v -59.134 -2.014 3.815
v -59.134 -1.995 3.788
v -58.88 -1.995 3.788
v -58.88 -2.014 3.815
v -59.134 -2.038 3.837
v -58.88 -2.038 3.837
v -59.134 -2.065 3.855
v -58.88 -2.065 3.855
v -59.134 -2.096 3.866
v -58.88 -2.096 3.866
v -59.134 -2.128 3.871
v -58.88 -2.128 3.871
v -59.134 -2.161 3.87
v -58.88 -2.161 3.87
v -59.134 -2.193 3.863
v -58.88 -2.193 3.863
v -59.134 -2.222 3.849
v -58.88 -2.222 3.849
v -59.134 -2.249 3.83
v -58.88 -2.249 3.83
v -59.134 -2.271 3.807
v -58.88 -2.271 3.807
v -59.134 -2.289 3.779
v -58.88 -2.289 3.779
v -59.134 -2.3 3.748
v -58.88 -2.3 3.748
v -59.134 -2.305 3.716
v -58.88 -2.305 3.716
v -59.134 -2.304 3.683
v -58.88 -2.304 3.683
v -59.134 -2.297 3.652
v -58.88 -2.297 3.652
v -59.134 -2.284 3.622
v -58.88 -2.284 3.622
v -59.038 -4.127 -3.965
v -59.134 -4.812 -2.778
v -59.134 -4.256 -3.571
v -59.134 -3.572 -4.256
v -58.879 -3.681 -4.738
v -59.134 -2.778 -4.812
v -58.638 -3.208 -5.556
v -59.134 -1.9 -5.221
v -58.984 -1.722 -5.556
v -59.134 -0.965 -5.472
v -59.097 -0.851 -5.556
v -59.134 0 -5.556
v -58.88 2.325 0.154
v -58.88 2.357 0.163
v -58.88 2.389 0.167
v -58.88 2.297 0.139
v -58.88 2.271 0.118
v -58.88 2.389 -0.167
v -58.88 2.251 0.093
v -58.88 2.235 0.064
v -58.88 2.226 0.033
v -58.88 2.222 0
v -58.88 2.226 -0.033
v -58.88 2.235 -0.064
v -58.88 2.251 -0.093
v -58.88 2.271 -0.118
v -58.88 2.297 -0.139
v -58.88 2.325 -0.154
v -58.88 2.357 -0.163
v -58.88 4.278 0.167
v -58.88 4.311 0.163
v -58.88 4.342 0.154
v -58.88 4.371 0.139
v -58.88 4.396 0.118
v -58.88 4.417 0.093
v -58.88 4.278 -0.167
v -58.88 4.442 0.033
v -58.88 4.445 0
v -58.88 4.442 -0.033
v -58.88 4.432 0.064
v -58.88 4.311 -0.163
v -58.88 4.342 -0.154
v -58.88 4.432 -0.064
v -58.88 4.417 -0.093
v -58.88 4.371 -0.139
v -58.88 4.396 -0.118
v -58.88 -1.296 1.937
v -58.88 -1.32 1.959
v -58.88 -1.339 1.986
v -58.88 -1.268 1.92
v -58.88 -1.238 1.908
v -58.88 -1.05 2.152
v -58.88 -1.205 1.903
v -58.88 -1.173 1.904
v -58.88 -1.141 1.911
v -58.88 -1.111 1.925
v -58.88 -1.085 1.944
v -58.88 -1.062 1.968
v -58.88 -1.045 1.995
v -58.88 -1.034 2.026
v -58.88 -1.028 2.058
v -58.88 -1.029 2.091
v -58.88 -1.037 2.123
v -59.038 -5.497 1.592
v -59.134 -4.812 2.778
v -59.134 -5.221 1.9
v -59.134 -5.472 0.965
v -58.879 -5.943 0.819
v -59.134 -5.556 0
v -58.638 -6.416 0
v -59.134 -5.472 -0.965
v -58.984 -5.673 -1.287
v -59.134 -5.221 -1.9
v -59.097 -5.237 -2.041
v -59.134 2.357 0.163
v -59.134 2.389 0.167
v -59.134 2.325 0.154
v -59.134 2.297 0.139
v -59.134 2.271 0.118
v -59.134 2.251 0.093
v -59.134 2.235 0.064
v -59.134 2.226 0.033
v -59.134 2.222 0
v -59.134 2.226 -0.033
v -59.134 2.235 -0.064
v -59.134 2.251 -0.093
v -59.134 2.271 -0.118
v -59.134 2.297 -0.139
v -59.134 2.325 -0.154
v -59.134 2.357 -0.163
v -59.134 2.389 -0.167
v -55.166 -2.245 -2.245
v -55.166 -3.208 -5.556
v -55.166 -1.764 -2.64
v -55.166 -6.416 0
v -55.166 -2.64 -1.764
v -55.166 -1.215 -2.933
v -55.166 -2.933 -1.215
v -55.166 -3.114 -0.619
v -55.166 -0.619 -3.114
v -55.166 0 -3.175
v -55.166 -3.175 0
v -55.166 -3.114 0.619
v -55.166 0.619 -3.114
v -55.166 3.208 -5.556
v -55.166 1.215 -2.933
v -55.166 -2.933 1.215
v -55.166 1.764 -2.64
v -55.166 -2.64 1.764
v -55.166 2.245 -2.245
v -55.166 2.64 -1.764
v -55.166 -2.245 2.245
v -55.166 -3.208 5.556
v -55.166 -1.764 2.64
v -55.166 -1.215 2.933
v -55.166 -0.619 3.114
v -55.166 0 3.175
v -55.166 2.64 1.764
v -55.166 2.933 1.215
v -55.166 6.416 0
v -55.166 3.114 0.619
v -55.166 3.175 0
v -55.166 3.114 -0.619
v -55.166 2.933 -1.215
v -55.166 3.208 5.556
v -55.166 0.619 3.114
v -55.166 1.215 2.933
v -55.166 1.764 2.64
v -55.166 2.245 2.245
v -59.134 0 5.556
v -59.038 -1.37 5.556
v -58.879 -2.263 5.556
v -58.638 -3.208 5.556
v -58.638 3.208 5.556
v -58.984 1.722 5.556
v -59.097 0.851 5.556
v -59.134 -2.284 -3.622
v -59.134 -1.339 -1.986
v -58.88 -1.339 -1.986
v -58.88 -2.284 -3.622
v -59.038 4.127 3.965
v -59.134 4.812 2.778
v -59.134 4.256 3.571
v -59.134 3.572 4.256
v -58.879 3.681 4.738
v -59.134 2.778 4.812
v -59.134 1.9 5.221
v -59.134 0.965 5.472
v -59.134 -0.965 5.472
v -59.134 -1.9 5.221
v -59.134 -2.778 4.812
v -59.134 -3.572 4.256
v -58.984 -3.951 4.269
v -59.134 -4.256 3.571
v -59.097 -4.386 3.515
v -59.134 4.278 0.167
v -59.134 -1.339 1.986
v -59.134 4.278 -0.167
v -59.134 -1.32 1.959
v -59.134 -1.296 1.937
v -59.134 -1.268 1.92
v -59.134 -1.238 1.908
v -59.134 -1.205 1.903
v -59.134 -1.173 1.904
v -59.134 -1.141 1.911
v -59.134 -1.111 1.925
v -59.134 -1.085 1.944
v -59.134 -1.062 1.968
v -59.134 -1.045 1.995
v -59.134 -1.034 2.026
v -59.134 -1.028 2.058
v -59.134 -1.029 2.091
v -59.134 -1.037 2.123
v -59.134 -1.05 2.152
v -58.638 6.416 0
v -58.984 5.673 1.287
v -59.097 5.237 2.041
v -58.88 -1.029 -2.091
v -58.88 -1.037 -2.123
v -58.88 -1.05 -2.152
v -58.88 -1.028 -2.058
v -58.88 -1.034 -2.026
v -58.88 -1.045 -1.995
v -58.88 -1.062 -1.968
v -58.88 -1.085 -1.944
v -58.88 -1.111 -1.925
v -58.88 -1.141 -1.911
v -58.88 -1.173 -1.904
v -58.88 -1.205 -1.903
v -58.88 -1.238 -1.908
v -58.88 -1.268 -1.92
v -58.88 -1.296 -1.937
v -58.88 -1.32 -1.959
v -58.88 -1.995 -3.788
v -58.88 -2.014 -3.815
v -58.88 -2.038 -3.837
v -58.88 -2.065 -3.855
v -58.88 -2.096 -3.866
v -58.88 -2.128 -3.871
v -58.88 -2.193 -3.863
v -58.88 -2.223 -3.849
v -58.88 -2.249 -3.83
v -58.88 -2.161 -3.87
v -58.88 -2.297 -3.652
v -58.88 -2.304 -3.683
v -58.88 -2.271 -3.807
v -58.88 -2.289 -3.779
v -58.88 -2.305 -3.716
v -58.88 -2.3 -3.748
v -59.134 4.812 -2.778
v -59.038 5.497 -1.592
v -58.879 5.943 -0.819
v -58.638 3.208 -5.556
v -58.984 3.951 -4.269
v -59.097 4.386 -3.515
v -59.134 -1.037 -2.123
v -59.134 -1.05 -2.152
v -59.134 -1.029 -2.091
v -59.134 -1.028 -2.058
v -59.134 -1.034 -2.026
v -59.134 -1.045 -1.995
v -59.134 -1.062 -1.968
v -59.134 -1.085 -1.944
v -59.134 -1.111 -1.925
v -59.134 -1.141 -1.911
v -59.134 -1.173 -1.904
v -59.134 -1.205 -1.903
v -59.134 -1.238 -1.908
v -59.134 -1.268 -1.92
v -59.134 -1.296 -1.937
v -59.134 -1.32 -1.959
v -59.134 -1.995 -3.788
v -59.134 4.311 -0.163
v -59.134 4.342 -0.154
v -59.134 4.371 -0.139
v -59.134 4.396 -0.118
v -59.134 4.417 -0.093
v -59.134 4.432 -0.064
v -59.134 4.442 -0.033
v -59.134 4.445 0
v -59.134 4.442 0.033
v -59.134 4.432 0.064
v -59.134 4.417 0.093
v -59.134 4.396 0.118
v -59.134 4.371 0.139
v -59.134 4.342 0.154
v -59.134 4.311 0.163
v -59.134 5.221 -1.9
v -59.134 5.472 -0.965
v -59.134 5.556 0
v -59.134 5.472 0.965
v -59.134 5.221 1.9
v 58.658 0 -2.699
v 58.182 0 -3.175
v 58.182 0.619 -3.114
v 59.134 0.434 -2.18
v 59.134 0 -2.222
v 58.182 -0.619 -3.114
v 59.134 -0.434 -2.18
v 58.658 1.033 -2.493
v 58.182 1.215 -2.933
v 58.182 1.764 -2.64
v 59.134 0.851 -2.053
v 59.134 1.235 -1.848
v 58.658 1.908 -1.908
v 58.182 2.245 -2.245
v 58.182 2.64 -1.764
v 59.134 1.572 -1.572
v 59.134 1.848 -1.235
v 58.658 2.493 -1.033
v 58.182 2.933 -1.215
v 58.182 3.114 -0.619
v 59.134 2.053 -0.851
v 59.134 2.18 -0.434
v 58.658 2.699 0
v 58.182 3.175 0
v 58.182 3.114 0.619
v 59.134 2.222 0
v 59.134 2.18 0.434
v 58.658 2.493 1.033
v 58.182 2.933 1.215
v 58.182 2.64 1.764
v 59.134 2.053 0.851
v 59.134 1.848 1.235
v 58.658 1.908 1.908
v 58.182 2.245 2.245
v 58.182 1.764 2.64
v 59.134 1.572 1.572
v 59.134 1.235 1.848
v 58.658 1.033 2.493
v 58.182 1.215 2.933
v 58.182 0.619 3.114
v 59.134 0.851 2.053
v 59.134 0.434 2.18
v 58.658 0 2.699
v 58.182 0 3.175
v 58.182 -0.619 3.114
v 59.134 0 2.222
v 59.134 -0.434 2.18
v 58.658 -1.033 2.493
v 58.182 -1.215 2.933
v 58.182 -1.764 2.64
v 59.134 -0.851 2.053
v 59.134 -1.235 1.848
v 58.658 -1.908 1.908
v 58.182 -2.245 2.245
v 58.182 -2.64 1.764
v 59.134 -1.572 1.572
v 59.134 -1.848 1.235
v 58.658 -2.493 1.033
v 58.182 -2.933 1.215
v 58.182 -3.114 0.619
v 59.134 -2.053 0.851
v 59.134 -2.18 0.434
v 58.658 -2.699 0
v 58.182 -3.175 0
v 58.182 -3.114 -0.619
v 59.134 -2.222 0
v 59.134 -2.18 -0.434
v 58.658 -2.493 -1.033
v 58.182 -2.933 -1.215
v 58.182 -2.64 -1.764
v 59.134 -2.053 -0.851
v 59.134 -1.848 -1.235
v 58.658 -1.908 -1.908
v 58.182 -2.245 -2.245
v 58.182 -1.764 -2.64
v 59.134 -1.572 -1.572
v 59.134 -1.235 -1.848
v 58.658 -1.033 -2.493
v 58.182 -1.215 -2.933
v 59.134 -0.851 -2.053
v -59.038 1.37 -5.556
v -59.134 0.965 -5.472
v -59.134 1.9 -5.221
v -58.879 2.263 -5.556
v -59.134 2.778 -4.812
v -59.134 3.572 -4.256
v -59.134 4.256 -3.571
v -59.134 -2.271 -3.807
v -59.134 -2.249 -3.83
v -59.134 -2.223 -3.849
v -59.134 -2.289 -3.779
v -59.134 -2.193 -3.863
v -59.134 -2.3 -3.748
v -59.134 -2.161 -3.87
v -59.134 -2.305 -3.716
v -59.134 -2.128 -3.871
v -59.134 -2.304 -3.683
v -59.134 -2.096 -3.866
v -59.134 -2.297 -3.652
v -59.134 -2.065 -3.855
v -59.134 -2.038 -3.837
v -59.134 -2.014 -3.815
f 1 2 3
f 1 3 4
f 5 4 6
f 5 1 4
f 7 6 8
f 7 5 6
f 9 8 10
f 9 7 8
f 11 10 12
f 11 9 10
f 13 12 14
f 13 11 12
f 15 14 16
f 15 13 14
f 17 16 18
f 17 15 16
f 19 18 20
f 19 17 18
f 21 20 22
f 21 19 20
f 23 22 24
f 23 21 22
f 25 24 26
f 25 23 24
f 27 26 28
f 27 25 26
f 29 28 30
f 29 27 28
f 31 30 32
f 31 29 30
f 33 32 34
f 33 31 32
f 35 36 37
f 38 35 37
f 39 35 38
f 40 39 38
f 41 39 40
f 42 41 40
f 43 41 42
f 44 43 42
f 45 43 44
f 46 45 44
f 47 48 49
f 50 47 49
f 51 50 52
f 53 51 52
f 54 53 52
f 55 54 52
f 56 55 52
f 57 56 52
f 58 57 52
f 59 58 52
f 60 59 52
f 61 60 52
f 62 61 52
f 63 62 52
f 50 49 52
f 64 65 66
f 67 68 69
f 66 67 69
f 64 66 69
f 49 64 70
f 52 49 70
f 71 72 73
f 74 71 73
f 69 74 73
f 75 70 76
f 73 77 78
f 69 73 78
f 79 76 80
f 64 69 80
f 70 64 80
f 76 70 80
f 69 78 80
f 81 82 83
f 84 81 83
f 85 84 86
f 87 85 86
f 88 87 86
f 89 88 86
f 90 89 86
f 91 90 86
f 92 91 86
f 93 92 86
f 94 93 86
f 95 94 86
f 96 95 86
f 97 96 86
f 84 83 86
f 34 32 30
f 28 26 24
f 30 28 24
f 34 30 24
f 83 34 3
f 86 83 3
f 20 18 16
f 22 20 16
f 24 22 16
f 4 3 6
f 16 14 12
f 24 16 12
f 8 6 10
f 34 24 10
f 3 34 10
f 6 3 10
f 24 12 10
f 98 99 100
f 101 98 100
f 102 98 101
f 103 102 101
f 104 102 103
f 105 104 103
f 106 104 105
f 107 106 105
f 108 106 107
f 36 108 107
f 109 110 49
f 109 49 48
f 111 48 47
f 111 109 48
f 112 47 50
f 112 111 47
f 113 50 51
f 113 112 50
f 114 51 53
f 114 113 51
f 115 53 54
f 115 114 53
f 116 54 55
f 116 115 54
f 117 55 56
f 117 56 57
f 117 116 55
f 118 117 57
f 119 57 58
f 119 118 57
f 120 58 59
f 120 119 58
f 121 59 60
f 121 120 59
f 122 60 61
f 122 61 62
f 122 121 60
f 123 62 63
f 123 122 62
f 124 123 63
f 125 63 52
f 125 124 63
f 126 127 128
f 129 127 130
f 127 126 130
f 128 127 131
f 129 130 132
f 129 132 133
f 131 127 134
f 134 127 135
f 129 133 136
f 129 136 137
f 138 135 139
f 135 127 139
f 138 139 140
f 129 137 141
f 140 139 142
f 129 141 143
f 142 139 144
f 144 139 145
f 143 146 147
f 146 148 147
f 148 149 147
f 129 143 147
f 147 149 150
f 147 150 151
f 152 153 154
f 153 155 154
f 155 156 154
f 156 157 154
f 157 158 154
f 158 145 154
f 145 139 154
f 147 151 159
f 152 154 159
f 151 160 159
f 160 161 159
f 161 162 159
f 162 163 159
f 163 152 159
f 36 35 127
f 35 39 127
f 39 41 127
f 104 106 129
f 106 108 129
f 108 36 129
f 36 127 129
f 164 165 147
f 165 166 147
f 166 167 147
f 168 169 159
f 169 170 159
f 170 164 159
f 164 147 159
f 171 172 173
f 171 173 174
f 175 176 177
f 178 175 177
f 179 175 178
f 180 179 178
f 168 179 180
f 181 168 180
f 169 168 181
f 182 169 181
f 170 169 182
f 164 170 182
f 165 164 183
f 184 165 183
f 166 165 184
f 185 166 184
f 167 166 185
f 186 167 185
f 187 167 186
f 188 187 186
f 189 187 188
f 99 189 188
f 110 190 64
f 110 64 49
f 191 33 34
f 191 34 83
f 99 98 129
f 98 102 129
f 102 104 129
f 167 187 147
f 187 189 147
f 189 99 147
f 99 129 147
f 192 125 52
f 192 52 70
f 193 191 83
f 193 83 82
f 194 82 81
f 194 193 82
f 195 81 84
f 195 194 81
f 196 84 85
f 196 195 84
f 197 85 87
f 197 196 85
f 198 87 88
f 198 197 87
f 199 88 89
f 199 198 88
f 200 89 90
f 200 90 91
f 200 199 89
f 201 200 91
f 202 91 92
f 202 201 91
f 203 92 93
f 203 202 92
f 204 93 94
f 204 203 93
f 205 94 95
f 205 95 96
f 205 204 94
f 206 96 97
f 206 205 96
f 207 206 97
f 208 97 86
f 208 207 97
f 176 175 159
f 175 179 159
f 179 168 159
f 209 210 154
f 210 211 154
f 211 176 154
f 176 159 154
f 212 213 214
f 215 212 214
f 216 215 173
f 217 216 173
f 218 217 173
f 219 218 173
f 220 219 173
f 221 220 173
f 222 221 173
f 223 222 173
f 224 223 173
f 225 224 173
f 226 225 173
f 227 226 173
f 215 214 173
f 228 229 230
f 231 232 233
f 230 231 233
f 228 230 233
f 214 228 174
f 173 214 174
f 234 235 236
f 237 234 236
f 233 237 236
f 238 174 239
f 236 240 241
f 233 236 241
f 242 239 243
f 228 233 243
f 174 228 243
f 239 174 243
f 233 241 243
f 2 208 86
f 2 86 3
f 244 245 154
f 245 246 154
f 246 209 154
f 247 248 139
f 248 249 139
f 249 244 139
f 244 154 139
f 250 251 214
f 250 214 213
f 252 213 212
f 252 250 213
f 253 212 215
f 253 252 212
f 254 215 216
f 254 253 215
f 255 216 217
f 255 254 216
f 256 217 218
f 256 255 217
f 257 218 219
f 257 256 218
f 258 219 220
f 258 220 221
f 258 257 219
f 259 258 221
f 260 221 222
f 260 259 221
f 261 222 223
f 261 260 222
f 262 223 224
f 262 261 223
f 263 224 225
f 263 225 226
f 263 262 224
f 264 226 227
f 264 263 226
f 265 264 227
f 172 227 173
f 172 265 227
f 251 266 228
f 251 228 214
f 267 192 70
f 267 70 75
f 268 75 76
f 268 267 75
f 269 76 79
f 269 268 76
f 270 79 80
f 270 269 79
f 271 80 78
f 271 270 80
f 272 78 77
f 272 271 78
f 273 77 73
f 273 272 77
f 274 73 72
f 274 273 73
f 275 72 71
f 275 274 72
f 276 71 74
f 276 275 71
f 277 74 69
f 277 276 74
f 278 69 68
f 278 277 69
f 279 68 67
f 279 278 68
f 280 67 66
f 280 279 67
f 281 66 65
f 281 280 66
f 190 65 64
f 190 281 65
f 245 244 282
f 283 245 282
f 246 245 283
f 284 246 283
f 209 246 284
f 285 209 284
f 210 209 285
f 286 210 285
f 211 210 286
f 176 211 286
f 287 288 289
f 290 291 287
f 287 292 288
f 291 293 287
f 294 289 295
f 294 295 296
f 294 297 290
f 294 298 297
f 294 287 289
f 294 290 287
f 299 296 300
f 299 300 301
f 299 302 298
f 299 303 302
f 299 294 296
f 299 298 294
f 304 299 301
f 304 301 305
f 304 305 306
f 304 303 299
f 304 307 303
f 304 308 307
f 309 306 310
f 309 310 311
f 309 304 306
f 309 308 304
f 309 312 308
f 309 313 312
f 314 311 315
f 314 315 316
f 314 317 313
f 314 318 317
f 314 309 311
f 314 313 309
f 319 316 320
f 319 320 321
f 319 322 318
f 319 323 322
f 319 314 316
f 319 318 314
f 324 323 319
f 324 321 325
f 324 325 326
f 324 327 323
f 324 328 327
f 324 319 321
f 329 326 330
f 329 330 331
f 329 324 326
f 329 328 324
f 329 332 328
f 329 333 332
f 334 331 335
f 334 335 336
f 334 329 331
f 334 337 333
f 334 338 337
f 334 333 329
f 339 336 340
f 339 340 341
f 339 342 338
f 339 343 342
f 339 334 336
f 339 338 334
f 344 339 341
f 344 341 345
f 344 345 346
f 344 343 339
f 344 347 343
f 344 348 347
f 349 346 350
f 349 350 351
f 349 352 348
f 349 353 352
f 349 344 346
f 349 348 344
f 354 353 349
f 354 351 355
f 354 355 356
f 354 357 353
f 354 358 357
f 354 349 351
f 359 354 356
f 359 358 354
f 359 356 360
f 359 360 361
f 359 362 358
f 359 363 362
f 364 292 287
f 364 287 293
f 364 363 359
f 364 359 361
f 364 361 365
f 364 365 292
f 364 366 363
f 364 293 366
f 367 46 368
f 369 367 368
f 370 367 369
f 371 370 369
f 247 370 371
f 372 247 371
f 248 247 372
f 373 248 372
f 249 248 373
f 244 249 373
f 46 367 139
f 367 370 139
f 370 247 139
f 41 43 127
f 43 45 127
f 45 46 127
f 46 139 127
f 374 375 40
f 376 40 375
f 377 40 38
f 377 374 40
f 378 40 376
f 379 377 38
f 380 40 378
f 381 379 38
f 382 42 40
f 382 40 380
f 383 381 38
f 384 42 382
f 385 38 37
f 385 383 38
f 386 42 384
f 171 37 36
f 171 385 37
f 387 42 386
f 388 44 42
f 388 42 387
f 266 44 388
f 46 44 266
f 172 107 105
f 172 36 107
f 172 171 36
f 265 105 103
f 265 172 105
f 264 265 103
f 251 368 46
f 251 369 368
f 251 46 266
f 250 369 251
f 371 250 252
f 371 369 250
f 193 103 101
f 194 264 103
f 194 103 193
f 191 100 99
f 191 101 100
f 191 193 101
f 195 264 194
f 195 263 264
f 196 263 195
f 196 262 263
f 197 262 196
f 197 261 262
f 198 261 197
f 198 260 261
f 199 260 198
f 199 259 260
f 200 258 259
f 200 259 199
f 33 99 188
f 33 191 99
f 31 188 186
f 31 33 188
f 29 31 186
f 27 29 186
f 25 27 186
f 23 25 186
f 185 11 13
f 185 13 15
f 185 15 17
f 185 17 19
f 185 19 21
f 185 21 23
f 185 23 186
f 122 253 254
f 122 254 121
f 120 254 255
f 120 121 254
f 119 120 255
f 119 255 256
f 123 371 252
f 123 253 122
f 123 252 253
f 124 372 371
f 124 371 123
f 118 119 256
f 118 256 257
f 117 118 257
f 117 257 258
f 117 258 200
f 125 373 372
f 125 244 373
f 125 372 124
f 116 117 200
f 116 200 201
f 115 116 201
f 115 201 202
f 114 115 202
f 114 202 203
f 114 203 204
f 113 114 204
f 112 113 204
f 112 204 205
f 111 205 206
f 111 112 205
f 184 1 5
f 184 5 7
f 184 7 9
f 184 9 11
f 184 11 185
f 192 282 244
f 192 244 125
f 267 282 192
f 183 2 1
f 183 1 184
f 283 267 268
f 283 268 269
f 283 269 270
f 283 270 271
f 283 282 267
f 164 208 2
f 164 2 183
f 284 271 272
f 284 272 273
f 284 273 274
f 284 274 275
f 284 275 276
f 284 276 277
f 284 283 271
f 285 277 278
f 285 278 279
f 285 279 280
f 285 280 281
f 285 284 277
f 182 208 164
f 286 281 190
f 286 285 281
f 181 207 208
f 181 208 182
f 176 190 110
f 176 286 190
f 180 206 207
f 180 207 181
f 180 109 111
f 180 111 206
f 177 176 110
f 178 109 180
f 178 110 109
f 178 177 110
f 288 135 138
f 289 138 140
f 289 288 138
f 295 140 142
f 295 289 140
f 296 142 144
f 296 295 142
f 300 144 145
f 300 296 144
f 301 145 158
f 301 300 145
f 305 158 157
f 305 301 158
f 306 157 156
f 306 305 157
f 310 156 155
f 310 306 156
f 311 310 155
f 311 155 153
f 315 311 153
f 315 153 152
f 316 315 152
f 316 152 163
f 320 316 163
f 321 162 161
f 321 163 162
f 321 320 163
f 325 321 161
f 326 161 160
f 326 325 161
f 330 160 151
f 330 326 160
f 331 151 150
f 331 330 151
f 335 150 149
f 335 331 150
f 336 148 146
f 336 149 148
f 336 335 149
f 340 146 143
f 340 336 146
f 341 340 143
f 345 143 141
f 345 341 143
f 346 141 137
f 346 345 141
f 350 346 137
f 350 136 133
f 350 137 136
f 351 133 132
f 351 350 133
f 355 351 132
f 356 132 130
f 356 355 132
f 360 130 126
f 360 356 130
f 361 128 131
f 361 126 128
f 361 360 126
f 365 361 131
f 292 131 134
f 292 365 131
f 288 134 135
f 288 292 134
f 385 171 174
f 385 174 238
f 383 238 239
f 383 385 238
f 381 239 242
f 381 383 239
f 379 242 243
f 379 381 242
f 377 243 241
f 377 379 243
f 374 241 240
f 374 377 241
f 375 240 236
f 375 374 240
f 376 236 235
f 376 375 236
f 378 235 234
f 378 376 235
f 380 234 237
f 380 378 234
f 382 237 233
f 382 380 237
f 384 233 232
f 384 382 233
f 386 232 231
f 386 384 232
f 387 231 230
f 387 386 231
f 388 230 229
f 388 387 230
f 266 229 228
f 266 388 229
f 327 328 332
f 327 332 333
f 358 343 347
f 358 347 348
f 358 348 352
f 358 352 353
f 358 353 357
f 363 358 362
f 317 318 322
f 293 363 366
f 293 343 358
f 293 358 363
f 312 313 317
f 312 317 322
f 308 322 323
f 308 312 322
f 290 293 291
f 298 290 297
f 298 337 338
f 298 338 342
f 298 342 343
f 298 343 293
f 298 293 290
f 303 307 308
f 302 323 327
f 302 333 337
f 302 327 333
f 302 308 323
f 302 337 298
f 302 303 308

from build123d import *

# Parameters (mm, degrees)
SKETCH5_R           = 3.175
BOSS_EXTRUDE3_DEPTH = 114.3
CHAMFER1_SIZE       = 0.9525
BOSS_EXTRUDE4_DEPTH = 3.96875
SKETCH8_OUTSIDE_W   = 450.168
SKETCH8_OUTSIDE_H   = 451.888
SKETCH8_OUTSIDE_R   = 5.55625
CUT_EXTRUDE3_DEPTH  = 119.26875
CUT_EXTRUDE3_TAPER  = 60
CUT_EXTRUDE4_DEPTH  = 0.254
CIRPATTERN1_COUNT   = 3


with BuildPart() as part:
    # Sketch5 → Boss-Extrude3 (new body)
    with BuildSketch(Plane(origin=(59.134375, 0, 0), x_dir=(0, 0, -1), z_dir=(1, 0, 0))):
        Circle(SKETCH5_R)
    extrude(amount=-BOSS_EXTRUDE3_DEPTH)

    # Chamfer1
    chamfer1_edges = [part.edges().sort_by_distance(p)[0] for p in [
        (59.134375, 0, 3.175),
    ]]
    chamfer(chamfer1_edges, length=CHAMFER1_SIZE)

    # Sketch11 → Revolve1 (revolve)
    with BuildSketch(Plane.XY):
        Polygon((-55.165625, 3.175), (-55.165625, 0), (43.259375, 0), (40.084375, 3.175), align=None)
    revolve(axis=Axis((-55.165625, 0, 0), (1, 0, 0)))

    # Sketch6 → Boss-Extrude4 (add)
    with BuildSketch(Plane.ZY.offset(55.165625)):
        Polygon((5.55625, 3.207902433), (0, 6.415804866), (-5.55625, 3.207902433), (-5.55625, -3.207902433), (0, -6.415804866), (5.55625, -3.207902433), align=None)
    extrude(amount=BOSS_EXTRUDE4_DEPTH)

    # Sketch8 outside → Cut-Extrude3 (cut, through all)
    with BuildSketch(Plane.ZY.offset(59.134375)):
        Rectangle(SKETCH8_OUTSIDE_W, SKETCH8_OUTSIDE_H)
        Circle(SKETCH8_OUTSIDE_R, mode=Mode.SUBTRACT)
    extrude(amount=-CUT_EXTRUDE3_DEPTH, taper=CUT_EXTRUDE3_TAPER, mode=Mode.SUBTRACT)

    # Sketch12 → Cut-Extrude4 (cut)
    with BuildSketch(Plane.ZY.offset(59.134375)):
        with BuildLine():
            Line((0.1666875, 4.2783125), (0.1666875, 2.3891875))
            ThreePointArc((0.1666875, 2.3891875), (0, 2.2225), (-0.1666875, 2.3891875))
            Line((-0.1666875, 2.3891875), (-0.1666875, 4.2783125))
            ThreePointArc((-0.1666875, 4.2783125), (0, 4.445), (0.1666875, 4.2783125))
        make_face()
    cut_extrude4 = extrude(amount=-CUT_EXTRUDE4_DEPTH, mode=Mode.SUBTRACT)

    # CirPattern1: Cut-Extrude4 ×3 about axis
    cirpattern1_axis = Axis((0, 0, 0), (1, 0, 0))
    for i in range(1, CIRPATTERN1_COUNT):
        add(cut_extrude4.rotate(cirpattern1_axis, i * 360 / CIRPATTERN1_COUNT), mode=Mode.SUBTRACT)


solid = part.part
